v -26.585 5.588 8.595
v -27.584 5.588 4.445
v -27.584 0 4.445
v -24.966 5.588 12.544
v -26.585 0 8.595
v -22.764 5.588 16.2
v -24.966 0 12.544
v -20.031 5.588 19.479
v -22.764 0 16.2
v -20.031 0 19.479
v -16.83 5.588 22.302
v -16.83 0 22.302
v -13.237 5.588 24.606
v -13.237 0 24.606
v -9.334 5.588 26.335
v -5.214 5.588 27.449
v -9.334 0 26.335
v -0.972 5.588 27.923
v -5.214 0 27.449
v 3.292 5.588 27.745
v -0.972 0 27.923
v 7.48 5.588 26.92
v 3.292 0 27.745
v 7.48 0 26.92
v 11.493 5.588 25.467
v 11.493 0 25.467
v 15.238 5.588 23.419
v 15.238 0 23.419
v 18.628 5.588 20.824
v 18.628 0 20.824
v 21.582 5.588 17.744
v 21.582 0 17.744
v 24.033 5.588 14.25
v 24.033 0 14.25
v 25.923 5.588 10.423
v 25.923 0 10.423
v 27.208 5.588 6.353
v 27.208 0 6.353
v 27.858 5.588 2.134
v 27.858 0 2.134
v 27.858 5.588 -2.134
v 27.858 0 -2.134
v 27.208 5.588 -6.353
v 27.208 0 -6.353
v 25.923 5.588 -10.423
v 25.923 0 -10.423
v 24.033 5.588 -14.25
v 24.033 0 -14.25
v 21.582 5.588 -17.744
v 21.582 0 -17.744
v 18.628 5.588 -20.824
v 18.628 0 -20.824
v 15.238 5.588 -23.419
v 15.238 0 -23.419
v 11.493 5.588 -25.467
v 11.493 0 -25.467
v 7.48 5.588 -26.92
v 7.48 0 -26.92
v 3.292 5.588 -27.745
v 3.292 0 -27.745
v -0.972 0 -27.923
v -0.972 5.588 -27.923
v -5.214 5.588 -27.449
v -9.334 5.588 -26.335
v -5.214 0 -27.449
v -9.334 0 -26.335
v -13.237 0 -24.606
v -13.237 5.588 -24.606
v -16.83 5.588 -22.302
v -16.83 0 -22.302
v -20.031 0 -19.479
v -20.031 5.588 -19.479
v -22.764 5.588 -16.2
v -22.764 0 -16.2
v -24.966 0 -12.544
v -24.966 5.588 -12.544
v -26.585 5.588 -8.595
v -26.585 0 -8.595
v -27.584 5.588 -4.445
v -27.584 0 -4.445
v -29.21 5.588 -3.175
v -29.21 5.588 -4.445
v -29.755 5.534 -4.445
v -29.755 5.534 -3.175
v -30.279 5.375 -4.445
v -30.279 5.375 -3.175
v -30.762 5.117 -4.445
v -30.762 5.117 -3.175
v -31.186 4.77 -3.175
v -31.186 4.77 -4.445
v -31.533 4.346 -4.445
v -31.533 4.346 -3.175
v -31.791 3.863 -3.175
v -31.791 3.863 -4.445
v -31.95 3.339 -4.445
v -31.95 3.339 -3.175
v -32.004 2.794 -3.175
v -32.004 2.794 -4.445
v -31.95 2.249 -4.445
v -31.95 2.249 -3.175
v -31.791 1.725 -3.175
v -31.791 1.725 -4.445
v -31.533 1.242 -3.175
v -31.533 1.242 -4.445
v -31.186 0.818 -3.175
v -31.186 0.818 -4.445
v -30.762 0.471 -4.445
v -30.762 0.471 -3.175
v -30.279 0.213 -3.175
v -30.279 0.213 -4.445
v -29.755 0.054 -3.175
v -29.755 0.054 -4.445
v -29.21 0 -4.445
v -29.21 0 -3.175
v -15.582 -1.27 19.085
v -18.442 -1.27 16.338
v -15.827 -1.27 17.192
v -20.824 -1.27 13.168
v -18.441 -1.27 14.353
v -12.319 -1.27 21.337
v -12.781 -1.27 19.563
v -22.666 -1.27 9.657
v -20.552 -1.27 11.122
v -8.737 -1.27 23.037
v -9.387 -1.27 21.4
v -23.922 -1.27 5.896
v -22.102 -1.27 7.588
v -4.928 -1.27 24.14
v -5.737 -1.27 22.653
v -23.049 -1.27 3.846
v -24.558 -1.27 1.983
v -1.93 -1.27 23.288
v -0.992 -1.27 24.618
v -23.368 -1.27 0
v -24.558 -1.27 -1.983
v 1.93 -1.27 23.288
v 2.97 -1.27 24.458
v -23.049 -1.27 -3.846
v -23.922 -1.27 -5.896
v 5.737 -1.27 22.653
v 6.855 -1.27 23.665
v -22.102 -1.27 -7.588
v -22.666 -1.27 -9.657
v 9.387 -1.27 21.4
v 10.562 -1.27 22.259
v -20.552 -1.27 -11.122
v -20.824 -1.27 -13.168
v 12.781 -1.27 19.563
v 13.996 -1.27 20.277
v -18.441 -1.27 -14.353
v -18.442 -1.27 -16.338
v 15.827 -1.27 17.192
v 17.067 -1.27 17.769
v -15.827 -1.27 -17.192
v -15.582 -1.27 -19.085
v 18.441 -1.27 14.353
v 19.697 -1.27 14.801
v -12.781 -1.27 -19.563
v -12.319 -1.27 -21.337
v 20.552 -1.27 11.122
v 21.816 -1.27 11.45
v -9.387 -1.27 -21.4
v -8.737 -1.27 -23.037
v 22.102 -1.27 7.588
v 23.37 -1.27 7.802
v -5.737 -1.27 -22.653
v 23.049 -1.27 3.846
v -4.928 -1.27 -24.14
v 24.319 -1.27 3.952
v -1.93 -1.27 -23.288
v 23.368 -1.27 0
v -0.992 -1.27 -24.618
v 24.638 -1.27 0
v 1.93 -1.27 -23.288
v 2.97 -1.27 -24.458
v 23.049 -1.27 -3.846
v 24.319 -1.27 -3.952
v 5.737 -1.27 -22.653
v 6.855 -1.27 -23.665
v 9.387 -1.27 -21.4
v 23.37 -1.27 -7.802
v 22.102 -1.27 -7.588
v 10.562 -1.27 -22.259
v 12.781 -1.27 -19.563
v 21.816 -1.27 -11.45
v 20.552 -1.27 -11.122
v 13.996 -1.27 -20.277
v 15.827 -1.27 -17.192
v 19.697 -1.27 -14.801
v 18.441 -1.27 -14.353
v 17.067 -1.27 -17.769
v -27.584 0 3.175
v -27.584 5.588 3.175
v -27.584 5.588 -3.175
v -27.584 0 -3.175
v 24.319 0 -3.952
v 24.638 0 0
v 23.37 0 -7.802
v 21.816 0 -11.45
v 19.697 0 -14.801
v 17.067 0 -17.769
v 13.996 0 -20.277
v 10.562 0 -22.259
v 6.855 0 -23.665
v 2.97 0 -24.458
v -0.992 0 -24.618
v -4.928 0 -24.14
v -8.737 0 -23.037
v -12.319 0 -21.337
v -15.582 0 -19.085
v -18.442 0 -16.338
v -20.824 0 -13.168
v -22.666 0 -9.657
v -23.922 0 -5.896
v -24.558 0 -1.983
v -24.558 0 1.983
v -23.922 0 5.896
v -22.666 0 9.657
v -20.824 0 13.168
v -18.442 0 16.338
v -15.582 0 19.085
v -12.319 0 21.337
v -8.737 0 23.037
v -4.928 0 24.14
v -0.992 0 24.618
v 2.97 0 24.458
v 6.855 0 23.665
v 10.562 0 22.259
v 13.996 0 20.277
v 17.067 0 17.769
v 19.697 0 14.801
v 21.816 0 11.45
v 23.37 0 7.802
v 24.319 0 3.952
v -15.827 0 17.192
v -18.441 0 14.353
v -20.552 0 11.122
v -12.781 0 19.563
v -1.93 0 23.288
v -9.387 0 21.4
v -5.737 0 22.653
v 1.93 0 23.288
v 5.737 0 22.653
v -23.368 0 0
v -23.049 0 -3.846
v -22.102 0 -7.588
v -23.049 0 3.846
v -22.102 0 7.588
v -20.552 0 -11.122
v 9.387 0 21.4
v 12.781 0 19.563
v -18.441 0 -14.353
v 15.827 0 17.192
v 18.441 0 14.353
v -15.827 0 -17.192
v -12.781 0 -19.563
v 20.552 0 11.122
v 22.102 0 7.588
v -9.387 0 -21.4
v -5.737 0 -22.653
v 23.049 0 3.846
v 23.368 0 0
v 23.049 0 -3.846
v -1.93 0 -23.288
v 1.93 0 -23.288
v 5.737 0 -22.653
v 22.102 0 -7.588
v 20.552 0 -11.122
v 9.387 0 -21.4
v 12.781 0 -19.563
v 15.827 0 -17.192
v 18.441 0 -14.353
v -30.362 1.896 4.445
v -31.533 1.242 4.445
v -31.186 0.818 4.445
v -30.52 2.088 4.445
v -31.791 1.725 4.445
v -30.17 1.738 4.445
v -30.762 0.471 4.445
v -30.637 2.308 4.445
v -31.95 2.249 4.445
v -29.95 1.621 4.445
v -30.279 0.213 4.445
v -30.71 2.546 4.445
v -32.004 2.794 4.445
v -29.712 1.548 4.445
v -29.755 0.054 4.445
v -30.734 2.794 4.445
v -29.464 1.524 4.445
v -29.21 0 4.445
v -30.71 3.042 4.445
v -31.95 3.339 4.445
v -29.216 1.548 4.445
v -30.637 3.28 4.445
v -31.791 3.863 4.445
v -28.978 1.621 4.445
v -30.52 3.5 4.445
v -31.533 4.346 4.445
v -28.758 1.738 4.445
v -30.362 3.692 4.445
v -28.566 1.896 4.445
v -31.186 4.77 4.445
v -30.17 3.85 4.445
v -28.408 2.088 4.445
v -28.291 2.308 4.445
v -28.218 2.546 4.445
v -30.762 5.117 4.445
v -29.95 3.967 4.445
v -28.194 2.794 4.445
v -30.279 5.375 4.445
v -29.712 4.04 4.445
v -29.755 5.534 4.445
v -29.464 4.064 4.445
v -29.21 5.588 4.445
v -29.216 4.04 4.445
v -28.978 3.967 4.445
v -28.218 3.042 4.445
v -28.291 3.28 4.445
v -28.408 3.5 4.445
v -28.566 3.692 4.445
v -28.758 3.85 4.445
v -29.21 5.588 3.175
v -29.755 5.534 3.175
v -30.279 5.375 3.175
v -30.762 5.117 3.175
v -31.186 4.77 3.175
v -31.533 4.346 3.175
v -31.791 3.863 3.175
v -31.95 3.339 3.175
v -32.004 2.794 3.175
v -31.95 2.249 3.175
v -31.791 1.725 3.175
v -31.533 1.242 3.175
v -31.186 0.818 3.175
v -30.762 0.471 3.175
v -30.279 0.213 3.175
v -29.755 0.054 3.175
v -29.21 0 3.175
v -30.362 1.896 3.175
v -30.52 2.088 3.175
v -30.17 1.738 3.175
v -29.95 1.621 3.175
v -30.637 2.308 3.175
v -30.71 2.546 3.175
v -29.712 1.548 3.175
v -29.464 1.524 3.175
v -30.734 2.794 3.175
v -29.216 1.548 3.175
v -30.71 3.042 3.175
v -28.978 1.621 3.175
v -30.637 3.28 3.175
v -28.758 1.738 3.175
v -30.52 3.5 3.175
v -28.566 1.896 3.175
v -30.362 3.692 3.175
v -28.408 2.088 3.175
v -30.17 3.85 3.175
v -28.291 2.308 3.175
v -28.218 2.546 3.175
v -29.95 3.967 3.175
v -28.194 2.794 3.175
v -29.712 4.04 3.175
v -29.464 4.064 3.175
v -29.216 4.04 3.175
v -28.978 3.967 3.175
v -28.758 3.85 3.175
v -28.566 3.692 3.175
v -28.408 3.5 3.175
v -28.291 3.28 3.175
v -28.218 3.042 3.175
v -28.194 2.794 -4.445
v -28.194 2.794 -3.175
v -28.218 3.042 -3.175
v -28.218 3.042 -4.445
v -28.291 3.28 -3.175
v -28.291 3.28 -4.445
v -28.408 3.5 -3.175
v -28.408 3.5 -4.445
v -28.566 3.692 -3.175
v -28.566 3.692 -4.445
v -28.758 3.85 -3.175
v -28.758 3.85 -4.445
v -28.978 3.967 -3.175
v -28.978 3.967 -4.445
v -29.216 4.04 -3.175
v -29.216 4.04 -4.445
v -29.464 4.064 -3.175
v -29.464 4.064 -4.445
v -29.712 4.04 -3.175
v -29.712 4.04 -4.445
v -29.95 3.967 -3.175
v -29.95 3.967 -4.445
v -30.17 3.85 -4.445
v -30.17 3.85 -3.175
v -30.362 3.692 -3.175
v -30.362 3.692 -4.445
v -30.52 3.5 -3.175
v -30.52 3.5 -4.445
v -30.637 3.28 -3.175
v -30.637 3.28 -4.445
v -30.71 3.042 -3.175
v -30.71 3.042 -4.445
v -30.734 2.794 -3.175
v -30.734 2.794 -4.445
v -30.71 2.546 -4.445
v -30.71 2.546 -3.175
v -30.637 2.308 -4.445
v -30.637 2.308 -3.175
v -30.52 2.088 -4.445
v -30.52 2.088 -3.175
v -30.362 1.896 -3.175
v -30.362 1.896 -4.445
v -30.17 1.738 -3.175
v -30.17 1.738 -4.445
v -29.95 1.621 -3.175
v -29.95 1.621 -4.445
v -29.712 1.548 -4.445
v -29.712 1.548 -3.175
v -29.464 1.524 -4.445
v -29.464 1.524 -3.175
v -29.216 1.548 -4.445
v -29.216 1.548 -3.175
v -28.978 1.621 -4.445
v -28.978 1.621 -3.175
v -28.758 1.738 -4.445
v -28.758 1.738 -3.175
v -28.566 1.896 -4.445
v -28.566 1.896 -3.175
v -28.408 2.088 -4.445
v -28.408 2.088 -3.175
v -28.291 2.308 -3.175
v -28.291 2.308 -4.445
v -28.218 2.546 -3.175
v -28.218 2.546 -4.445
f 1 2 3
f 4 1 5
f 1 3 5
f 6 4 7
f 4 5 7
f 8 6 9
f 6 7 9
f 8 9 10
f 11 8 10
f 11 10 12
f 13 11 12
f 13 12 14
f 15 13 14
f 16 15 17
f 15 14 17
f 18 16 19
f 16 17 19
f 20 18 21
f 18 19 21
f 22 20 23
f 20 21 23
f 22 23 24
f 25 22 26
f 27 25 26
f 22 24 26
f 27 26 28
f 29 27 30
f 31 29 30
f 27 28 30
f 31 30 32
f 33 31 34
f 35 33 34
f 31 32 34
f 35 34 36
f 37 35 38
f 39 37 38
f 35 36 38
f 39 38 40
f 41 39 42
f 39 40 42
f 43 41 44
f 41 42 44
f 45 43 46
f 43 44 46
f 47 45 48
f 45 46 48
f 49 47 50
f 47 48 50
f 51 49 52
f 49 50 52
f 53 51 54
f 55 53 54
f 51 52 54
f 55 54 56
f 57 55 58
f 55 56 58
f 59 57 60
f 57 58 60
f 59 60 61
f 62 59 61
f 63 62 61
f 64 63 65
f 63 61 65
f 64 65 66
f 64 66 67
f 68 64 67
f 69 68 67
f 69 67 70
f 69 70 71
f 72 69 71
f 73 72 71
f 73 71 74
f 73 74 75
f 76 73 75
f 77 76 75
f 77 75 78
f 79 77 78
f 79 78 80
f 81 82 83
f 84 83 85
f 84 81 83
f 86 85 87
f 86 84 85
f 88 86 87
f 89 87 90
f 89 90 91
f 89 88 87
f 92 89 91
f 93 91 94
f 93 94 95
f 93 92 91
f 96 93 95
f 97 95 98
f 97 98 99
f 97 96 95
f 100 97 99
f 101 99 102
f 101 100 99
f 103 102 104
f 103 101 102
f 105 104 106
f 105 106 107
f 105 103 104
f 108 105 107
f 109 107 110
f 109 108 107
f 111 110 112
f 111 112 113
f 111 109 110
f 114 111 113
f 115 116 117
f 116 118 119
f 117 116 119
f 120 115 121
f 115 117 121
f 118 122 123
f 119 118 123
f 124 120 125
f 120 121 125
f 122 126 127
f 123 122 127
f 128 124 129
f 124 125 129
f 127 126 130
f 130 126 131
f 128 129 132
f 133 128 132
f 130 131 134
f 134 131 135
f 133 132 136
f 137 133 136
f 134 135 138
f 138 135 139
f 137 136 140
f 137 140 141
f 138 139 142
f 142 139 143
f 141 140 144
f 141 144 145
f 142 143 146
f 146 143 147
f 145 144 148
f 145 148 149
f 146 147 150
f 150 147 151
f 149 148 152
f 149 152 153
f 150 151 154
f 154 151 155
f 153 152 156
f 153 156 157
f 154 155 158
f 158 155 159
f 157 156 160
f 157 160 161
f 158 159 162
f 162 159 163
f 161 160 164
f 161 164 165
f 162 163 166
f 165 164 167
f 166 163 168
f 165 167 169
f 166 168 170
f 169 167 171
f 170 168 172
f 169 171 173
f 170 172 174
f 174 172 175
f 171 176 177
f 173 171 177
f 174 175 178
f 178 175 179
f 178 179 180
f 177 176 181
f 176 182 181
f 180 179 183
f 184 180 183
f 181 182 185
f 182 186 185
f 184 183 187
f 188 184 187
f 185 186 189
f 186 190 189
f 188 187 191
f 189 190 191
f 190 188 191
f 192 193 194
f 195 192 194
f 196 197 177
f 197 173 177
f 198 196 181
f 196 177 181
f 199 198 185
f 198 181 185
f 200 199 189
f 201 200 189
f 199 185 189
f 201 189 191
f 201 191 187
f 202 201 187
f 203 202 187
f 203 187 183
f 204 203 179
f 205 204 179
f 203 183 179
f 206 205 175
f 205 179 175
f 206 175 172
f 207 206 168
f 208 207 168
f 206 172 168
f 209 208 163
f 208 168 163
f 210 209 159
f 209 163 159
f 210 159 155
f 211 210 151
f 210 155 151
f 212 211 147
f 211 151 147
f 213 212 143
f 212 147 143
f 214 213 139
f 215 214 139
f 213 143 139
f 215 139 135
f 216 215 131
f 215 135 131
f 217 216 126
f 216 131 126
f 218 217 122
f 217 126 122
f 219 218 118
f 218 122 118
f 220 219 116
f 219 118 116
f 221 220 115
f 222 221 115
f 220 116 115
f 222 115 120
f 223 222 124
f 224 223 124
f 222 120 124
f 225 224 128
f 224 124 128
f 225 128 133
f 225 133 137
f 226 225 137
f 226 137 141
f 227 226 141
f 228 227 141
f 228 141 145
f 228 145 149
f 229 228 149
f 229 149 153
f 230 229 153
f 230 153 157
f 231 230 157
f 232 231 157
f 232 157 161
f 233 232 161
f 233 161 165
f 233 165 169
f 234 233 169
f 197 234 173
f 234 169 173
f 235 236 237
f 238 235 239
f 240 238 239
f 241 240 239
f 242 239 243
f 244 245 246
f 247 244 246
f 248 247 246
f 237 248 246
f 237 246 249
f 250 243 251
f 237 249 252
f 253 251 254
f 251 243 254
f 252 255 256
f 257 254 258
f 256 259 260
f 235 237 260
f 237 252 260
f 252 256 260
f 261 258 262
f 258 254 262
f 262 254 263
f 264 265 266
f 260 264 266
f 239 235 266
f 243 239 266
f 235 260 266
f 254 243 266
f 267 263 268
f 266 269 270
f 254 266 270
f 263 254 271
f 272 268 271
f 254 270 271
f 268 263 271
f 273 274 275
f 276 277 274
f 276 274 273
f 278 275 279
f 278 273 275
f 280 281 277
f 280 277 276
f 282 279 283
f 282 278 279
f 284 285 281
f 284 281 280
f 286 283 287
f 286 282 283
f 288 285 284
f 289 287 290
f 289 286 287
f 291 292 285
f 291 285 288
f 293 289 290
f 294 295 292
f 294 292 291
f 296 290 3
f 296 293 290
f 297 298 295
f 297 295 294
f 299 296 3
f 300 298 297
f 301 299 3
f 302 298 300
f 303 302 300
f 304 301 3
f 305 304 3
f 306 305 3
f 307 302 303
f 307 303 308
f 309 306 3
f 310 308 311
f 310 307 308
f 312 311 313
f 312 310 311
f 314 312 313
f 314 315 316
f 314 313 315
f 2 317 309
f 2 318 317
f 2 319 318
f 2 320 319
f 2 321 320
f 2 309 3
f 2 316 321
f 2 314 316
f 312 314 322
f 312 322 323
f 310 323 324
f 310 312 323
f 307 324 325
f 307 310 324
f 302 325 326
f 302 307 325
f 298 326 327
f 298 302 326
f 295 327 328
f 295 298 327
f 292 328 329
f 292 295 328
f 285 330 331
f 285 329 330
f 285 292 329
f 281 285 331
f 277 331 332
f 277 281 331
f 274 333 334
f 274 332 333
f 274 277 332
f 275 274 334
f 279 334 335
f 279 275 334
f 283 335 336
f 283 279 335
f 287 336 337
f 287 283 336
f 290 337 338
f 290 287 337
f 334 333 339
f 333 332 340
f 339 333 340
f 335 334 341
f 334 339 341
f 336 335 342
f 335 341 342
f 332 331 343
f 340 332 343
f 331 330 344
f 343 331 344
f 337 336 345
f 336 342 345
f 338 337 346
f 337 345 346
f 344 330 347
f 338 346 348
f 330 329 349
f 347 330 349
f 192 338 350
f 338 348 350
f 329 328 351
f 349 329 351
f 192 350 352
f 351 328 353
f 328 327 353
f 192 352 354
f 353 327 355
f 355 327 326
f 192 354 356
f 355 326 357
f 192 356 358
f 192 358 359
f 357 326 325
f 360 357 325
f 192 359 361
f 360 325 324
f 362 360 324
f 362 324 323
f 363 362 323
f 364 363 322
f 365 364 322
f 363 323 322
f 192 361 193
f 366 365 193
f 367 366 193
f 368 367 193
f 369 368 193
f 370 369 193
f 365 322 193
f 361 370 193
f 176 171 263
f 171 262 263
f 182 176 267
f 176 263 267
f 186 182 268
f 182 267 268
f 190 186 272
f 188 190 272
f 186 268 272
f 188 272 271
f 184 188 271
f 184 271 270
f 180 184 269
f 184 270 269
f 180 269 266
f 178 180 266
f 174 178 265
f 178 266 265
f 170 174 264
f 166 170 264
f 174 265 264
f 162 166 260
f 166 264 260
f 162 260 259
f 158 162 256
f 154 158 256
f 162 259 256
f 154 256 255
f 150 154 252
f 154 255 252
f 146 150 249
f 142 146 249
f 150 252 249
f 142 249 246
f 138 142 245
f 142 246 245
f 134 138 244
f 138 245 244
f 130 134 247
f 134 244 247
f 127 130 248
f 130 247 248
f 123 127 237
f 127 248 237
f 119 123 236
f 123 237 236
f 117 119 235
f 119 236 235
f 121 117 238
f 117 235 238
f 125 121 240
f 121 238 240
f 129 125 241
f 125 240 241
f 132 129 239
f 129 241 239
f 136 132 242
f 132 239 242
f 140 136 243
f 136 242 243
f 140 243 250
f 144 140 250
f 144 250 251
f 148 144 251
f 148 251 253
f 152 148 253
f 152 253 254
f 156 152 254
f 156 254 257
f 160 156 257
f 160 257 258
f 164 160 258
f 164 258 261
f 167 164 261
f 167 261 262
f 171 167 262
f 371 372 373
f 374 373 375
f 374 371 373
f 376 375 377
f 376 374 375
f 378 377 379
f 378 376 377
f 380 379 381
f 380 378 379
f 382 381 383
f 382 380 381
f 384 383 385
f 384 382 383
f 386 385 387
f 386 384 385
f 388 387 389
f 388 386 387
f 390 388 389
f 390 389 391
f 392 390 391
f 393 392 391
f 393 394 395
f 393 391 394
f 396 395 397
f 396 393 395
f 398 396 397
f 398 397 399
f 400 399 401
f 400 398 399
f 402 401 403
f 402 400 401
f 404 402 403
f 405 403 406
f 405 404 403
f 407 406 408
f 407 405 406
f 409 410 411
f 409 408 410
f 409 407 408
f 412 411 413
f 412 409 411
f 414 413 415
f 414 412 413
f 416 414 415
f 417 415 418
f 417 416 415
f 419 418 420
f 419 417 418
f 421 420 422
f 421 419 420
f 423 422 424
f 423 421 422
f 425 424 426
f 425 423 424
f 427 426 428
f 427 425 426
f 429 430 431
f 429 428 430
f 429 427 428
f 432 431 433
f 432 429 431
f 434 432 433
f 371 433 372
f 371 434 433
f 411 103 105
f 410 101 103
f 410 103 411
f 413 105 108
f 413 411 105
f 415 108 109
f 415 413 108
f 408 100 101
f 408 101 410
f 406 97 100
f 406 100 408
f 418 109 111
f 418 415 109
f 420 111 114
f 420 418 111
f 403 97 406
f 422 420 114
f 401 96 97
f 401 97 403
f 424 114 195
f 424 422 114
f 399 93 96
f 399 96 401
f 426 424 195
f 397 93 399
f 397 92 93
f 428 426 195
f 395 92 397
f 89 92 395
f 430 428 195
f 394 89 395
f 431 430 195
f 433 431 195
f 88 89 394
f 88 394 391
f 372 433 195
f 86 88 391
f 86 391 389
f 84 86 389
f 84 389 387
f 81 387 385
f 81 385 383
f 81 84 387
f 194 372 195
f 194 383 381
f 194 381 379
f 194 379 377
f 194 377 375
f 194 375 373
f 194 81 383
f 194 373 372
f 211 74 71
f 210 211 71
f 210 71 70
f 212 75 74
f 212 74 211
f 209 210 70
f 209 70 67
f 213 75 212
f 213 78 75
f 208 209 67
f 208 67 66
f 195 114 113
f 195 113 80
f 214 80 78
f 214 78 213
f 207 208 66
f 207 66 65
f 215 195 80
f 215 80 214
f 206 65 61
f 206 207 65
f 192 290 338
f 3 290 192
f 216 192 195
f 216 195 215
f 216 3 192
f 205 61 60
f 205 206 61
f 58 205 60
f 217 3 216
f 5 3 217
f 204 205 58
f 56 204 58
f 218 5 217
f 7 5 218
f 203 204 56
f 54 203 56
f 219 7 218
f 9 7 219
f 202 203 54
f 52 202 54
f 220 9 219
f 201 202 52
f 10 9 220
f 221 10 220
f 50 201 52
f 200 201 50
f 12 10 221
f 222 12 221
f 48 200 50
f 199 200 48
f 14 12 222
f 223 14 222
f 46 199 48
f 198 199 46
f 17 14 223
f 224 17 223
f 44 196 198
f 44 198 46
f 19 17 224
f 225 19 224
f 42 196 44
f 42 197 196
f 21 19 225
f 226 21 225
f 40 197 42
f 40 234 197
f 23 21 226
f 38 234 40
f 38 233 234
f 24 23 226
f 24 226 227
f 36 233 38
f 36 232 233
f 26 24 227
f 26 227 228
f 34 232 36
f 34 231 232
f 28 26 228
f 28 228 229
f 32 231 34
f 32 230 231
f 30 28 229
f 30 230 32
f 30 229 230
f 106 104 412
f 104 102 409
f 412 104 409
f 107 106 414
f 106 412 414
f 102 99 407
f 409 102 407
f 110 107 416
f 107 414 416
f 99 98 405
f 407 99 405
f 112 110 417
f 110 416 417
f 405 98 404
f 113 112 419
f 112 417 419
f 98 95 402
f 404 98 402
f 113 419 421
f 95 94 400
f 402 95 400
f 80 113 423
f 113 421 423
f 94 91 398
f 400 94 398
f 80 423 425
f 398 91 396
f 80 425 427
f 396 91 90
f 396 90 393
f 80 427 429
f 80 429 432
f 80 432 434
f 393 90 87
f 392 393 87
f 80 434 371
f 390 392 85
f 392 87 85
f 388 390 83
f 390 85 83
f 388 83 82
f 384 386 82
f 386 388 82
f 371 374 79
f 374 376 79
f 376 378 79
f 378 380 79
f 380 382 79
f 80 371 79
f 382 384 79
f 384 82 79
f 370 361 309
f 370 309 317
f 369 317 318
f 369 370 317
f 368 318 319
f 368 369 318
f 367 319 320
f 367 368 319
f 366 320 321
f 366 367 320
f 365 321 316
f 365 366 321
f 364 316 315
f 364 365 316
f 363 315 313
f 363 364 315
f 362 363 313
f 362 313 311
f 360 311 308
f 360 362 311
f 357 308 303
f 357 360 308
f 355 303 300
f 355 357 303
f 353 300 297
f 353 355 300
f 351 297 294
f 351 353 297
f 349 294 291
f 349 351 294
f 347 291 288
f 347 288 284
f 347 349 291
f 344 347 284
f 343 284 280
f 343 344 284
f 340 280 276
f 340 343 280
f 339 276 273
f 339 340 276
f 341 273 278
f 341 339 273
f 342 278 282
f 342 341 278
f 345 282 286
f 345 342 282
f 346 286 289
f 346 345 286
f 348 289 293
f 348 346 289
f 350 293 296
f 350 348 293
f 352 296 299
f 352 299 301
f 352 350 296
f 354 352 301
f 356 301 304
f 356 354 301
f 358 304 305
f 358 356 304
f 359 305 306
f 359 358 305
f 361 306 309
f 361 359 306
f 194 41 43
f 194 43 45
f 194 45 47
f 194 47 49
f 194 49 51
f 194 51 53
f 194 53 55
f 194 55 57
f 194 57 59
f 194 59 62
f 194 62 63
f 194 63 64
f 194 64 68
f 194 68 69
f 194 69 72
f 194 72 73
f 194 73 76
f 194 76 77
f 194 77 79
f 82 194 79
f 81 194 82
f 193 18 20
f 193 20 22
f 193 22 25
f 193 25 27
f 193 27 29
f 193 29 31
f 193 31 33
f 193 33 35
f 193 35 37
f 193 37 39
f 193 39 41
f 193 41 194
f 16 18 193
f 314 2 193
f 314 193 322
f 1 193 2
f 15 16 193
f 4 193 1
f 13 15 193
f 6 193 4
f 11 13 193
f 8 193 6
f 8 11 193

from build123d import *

# Parameters (mm, degrees)
SKETCH3_R           = 1.27
BOSS_EXTRUDE1_DEPTH = 4.445
SKETCH4_W           = 4.419845581
SKETCH4_H           = 6.35
CUT_EXTRUDE1_DEPTH  = 5.588


with BuildPart() as part:
    # Sketch2 → Revolve1 (revolve)
    with BuildSketch(Plane.XY):
        Polygon((0, 0), (0, 5.588), (27.94, 5.588), (27.94, 0), (24.638, 0), (24.638, -1.27), (23.368, -1.27), (23.368, 0), align=None)
    revolve(axis=Axis((0, -1000, 0), (0, 1, 0)))

    # Sketch3 → Boss-Extrude1 (add, symmetric)
    with BuildSketch(Plane.XY):
        with BuildLine():
            Line((-29.21, 0), (-27.305, 0))
            Line((-27.305, 0), (-27.305, 5.588))
            Line((-27.305, 5.588), (-29.21, 5.588))
            ThreePointArc((-29.21, 5.588), (-32.004, 2.794), (-29.21, 0))
        make_face()
        with Locations((-29.464, 2.794)):
            Circle(SKETCH3_R, mode=Mode.SUBTRACT)
    extrude(amount=BOSS_EXTRUDE1_DEPTH, both=True)

    # Sketch4 → Cut-Extrude1 (cut)
    with BuildSketch(Plane(origin=(0, 5.588, 0), x_dir=(1, 0, 0), z_dir=(0, 1, 0))):
        with Locations((-29.79407721, 0)):
            Rectangle(SKETCH4_W, SKETCH4_H)
    extrude(amount=-CUT_EXTRUDE1_DEPTH, mode=Mode.SUBTRACT)


solid = part.part
